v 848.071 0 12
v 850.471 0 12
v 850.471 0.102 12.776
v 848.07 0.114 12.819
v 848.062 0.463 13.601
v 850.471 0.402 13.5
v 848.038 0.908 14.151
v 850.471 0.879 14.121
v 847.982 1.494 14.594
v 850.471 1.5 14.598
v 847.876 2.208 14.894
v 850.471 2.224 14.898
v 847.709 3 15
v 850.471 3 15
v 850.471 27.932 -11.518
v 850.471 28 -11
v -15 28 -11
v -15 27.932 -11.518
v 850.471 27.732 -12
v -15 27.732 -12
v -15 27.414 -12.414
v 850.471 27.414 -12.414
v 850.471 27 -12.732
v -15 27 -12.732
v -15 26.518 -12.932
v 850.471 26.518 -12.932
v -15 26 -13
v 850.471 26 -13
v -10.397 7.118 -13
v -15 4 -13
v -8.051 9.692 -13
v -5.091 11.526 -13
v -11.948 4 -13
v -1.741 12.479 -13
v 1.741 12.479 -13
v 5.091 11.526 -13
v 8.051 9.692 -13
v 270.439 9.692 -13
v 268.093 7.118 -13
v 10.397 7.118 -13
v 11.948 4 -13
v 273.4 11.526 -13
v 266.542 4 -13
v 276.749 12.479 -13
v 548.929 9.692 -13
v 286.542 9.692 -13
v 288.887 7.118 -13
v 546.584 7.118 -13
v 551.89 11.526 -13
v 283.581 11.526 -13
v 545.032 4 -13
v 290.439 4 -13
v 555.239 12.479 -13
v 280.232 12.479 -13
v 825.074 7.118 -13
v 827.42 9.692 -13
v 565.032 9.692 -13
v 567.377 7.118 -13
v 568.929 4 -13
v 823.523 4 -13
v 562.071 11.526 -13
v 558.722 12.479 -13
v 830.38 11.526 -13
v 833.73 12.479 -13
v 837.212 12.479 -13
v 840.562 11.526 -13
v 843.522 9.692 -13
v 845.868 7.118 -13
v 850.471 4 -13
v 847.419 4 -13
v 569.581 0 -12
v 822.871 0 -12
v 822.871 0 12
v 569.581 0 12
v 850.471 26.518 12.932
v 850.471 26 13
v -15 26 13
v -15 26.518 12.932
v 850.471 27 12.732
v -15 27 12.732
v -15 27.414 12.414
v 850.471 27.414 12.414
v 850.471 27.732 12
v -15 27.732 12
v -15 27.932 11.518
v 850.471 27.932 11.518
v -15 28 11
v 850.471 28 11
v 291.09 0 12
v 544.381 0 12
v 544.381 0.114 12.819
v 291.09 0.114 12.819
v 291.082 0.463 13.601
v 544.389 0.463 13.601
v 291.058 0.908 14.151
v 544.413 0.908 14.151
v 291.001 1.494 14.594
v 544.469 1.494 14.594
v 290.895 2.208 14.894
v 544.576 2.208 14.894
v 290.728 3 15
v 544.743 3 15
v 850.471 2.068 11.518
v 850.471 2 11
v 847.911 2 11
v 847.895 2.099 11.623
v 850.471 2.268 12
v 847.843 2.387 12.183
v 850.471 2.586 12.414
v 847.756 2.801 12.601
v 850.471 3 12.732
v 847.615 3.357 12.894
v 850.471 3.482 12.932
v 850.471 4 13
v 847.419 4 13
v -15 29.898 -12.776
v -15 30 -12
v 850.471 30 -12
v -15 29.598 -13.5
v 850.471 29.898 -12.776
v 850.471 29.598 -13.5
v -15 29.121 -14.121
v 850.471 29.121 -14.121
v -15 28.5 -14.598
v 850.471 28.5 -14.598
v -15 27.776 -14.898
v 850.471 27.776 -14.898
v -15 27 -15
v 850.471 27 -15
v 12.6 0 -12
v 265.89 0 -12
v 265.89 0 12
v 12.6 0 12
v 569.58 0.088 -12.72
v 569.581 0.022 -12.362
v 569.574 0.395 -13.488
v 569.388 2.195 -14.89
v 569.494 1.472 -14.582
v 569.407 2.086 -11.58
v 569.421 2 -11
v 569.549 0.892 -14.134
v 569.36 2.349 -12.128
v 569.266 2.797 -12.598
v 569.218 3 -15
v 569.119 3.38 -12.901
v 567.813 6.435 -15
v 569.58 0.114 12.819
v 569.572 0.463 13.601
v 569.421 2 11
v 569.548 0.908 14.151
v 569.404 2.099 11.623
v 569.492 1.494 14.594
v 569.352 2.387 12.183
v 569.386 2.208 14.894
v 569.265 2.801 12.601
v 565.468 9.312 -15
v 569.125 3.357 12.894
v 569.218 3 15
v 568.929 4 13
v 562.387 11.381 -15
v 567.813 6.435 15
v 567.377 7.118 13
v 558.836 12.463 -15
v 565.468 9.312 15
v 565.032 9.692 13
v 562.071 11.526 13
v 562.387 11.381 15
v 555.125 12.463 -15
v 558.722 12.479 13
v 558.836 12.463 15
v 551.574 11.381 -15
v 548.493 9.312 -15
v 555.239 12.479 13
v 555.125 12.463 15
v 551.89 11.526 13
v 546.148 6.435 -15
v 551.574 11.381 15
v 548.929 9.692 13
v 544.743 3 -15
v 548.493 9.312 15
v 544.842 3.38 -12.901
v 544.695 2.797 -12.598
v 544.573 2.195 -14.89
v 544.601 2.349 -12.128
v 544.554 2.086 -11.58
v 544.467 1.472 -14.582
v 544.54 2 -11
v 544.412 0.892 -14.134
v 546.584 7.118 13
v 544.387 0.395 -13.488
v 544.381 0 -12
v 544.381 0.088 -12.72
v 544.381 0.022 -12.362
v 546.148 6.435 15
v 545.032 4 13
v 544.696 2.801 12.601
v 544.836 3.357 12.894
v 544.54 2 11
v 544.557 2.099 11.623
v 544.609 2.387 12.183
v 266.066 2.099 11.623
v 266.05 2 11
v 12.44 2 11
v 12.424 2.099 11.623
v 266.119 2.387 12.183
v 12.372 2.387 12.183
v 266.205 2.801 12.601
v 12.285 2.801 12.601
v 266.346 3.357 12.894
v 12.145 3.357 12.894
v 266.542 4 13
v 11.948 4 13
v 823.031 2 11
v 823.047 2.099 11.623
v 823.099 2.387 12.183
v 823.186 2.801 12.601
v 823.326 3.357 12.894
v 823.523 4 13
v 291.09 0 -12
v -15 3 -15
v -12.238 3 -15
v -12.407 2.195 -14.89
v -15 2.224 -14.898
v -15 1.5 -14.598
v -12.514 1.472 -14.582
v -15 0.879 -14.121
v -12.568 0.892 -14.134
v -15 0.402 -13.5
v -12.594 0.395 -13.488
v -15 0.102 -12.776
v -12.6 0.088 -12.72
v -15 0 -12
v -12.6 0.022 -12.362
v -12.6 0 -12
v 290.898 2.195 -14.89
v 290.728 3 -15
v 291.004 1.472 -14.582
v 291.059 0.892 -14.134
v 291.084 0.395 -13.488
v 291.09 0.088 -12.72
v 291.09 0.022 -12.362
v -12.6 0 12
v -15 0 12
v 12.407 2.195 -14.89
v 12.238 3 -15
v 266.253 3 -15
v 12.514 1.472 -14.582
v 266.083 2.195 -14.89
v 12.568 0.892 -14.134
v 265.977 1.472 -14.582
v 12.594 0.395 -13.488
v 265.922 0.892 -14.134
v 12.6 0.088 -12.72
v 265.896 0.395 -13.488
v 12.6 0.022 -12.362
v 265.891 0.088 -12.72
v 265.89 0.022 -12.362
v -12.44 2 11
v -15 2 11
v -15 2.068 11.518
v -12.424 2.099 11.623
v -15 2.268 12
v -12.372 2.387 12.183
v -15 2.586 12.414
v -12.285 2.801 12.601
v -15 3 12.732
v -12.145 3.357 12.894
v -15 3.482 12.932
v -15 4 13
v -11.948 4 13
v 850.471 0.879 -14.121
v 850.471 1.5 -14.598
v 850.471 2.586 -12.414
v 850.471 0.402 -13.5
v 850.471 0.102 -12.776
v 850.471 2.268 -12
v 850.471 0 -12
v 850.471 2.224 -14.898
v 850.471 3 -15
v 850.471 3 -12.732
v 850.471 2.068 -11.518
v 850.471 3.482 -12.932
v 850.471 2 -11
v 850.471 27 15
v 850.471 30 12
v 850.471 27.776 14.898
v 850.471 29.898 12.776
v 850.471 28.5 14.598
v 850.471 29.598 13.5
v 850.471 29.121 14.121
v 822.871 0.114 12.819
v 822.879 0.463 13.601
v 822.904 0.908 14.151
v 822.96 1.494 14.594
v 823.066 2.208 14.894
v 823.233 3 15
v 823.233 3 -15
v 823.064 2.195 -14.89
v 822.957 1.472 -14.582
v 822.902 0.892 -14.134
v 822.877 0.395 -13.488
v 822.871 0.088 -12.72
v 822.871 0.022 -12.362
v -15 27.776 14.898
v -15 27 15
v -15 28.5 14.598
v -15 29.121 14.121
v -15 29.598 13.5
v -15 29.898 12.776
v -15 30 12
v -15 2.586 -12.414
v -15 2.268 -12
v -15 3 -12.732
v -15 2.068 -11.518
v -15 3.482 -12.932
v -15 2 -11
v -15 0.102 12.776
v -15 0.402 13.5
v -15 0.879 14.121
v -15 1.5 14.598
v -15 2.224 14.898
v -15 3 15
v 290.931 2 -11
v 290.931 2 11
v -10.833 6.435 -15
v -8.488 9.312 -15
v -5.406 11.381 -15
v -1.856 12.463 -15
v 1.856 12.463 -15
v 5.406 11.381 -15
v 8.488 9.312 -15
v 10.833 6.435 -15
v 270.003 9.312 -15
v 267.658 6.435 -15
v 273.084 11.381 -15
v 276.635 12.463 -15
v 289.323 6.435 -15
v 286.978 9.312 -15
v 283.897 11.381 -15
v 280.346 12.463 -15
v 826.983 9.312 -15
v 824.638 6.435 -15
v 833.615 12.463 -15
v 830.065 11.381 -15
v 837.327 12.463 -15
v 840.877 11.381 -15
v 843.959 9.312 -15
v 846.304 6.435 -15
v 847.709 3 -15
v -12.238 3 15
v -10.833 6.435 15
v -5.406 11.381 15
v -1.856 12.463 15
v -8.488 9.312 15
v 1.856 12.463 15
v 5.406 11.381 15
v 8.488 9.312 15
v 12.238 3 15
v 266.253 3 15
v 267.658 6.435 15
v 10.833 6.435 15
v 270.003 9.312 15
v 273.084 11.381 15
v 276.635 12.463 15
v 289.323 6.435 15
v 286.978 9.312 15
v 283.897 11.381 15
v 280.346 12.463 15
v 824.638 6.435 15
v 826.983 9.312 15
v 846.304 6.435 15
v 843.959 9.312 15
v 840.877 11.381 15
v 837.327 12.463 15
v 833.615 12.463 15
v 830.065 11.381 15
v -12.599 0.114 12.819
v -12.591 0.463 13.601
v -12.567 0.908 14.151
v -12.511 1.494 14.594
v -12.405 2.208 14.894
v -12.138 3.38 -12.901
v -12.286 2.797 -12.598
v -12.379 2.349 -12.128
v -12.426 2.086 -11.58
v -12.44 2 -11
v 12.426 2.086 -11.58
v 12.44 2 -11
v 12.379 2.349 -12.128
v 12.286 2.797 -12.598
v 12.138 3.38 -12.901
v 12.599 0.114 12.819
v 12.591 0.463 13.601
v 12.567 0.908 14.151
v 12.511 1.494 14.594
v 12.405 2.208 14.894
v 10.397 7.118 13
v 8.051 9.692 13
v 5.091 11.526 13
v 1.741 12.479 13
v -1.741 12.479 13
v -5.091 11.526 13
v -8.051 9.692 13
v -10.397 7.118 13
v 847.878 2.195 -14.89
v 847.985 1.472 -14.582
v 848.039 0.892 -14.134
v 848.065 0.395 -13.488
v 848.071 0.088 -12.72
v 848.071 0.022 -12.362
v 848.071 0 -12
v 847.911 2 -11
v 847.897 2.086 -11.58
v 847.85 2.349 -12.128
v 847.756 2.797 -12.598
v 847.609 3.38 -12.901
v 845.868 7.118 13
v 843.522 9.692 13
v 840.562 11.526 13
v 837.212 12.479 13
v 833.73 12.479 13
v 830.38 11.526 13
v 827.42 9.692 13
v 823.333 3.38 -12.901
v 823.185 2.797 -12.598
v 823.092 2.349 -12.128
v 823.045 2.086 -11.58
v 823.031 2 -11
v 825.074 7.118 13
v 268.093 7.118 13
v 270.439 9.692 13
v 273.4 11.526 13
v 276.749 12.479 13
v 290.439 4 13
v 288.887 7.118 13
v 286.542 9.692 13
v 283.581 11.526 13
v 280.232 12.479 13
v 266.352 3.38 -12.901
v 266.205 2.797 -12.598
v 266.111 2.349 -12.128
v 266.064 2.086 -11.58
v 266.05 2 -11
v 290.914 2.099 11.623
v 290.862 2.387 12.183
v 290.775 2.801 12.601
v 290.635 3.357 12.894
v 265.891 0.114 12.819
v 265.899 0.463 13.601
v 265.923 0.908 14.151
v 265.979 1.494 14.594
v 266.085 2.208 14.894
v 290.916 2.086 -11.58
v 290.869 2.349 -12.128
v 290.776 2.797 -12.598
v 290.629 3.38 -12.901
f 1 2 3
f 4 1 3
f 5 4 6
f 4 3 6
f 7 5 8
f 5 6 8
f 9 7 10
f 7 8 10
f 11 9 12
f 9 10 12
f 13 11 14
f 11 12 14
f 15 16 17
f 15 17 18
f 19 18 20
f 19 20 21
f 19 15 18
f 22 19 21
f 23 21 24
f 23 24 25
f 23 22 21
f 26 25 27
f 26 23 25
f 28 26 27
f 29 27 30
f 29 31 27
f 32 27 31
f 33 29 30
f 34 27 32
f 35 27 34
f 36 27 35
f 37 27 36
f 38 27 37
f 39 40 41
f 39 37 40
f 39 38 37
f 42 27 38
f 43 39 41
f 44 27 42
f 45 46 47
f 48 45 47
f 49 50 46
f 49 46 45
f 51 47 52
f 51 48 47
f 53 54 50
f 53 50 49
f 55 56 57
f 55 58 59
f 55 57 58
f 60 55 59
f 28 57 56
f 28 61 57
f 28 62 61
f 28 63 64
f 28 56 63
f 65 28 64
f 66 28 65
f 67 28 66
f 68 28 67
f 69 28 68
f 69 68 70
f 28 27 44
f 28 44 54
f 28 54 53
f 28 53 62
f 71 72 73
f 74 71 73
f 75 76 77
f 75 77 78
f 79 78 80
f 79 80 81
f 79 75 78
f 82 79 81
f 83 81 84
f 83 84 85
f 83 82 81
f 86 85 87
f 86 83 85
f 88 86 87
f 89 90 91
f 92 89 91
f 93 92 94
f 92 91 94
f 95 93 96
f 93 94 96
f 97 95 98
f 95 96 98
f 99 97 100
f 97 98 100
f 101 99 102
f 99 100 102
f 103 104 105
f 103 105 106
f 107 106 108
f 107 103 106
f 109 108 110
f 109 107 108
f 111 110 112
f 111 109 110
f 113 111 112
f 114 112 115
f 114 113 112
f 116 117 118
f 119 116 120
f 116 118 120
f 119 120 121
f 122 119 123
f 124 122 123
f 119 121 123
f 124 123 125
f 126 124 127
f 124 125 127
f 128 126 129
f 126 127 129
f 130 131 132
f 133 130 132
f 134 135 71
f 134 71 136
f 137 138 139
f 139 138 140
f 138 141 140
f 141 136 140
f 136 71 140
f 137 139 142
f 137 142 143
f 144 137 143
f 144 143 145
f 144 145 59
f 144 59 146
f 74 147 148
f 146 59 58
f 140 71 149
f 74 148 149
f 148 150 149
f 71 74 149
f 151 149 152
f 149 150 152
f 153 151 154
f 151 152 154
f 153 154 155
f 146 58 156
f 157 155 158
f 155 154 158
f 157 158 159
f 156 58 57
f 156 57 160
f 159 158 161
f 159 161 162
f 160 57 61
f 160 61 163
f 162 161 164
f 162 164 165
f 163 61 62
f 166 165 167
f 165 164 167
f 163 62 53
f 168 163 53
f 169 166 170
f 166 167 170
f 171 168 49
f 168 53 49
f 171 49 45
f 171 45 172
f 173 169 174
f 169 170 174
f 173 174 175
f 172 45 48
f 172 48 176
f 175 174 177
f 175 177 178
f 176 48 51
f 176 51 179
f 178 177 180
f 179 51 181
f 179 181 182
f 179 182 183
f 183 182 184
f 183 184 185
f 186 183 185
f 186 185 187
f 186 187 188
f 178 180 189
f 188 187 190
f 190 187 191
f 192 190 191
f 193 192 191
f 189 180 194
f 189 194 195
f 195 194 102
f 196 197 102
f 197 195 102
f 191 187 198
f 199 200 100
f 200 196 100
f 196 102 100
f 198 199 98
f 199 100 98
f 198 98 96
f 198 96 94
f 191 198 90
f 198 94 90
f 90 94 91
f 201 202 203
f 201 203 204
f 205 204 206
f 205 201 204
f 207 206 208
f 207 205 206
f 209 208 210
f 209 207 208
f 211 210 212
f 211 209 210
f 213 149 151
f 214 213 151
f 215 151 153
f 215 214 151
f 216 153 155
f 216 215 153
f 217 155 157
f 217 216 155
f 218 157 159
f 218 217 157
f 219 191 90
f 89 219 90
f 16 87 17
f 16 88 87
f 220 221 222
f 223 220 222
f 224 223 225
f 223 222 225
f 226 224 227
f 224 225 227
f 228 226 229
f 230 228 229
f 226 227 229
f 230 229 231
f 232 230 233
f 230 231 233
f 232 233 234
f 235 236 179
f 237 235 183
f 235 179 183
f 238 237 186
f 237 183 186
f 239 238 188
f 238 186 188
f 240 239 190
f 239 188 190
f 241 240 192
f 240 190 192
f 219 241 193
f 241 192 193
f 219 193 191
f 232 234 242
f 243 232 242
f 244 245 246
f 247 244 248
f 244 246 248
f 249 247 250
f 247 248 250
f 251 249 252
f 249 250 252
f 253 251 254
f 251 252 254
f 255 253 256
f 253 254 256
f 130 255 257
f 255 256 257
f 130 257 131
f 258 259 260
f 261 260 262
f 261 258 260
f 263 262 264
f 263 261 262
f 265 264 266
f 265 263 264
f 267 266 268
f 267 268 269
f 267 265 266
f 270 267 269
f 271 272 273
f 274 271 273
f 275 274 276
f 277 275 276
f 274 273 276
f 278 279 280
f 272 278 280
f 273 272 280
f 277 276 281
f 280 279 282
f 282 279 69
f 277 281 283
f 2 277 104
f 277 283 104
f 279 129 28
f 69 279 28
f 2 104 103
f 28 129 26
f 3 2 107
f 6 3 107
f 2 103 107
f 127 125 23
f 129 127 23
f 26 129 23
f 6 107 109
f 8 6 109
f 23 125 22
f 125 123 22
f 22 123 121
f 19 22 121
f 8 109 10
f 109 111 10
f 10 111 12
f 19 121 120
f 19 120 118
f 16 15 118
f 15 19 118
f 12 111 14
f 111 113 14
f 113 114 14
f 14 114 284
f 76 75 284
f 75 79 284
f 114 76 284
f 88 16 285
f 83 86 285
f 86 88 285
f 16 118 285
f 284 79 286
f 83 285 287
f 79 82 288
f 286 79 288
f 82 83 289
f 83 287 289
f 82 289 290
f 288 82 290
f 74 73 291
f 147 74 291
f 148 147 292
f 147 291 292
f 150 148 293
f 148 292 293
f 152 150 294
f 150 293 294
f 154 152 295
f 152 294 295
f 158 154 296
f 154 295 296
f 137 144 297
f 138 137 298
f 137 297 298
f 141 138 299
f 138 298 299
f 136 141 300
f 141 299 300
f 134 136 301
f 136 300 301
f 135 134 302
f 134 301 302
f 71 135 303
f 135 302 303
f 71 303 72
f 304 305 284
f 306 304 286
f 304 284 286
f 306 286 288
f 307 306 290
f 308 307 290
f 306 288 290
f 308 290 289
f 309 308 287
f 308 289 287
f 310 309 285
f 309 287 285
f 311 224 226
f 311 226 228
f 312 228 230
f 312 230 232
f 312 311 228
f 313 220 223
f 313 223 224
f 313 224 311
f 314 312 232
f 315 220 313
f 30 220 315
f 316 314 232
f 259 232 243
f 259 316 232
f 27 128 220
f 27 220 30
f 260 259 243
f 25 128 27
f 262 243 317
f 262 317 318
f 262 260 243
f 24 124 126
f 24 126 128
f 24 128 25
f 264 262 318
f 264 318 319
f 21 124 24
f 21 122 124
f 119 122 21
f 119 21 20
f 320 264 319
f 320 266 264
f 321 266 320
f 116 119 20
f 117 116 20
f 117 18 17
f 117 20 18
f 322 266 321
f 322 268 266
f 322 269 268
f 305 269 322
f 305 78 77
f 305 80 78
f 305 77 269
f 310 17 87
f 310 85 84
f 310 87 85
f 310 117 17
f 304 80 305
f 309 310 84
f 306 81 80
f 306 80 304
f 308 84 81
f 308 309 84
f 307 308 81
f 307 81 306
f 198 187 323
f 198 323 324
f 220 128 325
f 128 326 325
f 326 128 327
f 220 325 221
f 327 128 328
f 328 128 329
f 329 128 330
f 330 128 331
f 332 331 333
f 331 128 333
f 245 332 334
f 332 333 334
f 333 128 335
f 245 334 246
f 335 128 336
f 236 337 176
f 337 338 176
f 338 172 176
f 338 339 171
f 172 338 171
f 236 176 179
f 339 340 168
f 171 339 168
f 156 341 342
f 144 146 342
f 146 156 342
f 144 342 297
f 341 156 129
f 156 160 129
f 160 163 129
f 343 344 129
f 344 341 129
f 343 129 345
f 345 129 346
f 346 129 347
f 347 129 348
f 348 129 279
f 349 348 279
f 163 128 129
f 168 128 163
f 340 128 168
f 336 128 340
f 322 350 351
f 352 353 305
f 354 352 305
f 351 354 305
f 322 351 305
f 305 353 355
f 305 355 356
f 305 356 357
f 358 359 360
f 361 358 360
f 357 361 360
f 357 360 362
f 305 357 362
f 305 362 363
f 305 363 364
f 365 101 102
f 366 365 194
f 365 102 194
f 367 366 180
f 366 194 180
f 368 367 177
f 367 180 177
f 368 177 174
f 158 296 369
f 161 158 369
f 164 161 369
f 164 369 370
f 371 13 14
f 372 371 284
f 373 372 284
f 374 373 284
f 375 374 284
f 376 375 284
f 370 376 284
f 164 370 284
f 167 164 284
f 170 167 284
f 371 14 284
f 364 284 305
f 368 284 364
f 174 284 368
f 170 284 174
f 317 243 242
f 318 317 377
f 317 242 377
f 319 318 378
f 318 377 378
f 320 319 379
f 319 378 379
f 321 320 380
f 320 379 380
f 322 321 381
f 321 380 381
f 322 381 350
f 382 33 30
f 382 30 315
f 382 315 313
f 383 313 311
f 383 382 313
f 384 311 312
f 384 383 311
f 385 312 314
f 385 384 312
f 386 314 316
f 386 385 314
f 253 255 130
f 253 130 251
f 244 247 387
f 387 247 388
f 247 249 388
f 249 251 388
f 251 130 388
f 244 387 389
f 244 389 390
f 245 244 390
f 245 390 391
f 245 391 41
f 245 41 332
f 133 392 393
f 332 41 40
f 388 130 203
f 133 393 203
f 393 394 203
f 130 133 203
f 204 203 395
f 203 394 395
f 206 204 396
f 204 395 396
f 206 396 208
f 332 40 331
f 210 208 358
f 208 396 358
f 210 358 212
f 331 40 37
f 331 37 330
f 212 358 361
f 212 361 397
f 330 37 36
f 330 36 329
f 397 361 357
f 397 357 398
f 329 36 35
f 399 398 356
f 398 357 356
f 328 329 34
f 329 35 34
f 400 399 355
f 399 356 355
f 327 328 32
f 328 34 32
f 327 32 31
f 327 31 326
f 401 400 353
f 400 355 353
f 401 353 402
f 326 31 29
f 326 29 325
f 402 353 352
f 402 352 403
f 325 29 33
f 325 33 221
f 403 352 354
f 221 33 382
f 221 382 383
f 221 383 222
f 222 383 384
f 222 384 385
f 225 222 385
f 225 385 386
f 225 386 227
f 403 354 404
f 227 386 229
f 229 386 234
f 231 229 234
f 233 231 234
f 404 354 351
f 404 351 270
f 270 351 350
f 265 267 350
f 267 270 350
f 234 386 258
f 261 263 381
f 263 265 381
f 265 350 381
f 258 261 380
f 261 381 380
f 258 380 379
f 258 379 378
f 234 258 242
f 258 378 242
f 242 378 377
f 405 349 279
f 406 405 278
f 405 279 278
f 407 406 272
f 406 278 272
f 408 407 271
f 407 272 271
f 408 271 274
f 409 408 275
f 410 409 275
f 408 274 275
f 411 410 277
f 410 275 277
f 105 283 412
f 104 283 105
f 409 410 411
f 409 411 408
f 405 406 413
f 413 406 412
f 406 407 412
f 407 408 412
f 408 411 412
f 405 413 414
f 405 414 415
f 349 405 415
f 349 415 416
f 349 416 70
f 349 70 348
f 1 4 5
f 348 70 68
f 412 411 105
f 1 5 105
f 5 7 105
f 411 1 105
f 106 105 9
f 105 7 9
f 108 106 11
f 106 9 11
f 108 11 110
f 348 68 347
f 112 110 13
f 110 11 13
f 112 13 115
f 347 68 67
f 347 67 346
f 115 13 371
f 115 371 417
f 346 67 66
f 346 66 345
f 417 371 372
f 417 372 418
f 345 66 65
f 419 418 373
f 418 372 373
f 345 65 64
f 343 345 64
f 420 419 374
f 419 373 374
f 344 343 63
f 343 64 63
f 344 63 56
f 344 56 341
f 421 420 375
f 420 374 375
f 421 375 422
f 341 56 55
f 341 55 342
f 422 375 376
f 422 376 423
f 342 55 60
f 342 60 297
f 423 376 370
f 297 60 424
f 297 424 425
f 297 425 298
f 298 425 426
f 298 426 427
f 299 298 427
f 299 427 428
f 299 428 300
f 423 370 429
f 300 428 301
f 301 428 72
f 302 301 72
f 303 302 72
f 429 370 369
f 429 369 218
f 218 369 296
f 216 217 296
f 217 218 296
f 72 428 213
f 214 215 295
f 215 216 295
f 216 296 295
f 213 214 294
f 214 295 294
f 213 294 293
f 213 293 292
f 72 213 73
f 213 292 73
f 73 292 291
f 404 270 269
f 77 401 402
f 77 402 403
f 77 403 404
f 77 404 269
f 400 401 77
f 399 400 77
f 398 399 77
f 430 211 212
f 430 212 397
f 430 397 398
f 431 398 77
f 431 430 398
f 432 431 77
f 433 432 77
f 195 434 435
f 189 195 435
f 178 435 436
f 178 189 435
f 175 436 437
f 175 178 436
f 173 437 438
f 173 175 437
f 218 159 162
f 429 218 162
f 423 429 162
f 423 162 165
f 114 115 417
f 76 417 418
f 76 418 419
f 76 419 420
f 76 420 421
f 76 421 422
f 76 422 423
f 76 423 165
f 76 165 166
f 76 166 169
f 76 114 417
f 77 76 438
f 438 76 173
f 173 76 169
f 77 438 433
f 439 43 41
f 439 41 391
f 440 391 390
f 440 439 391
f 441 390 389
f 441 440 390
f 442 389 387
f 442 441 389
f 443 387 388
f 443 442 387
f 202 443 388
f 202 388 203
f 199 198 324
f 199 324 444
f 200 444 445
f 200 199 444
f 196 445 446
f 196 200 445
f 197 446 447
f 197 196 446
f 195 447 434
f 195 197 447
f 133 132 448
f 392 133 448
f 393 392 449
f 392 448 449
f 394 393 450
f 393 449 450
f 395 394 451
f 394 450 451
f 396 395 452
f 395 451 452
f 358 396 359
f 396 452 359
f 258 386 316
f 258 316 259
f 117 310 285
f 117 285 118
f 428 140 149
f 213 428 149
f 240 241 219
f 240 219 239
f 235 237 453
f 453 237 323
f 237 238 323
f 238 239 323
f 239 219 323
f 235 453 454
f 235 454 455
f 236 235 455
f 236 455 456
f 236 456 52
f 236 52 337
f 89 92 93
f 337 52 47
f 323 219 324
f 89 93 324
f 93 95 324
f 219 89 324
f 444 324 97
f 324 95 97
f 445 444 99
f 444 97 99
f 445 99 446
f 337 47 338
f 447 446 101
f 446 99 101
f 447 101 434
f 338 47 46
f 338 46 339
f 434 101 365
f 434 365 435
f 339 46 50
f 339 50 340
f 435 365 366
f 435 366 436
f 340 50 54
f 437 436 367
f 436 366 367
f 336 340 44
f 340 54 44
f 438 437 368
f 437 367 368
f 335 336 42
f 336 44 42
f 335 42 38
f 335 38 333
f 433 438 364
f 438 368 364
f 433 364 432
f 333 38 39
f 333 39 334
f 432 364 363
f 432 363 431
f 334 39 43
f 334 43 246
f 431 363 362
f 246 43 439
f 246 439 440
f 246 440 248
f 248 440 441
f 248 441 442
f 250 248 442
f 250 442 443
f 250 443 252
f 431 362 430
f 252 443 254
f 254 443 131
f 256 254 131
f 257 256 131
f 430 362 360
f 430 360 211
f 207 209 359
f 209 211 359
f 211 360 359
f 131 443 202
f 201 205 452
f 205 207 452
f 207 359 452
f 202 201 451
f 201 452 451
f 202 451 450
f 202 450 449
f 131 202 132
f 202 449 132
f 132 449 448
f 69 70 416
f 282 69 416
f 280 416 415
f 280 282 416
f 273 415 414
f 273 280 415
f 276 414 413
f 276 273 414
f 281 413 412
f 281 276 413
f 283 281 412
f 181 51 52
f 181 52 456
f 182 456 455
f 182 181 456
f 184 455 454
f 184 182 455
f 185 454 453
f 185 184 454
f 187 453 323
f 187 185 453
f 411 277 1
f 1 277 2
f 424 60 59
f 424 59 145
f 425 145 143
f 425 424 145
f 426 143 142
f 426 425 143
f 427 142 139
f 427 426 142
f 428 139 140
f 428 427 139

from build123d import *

# Parameters (mm, degrees)
EXTRUDE_1_DEPTH      = 850.470859
EXTRUDE_1_DEPTH_BACK = 15
SKETCH_3_R           = 12.6
CUT_EXTRUDE_1_DEPTH  = 31


with BuildPart() as part:
    # Эскиз2 → Бобышка-Вытянуть1 (new body, two sides)
    with BuildSketch(Plane(origin=(0, 0, 0), x_dir=(0, 0, -1), z_dir=(1, 0, 0))) as extrude_1_sk:
        with BuildLine():
            Line((-12, 30), (12, 30))
            ThreePointArc((12, 30), (14.121320344, 29.121320344), (15, 27))
            Line((15, 27), (15, 3))
            ThreePointArc((15, 3), (14.121320344, 0.878679656), (12, 0))
            Line((12, 0), (-12, 0))
            ThreePointArc((-12, 0), (-14.121320344, 0.878679656), (-15, 3))
            Line((-15, 3), (-15, 27))
            ThreePointArc((-15, 27), (-14.121320344, 29.121320344), (-12, 30))
        make_face()
        with BuildLine():
            Line((-11, 28), (11, 28))
            ThreePointArc((11, 28), (12.414213562, 27.414213562), (13, 26))
            Line((13, 26), (13, 4))
            ThreePointArc((13, 4), (12.414213562, 2.585786438), (11, 2))
            Line((11, 2), (-11, 2))
            ThreePointArc((-11, 2), (-12.414213562, 2.585786438), (-13, 4))
            Line((-13, 4), (-13, 26))
            ThreePointArc((-13, 26), (-12.414213562, 27.414213562), (-11, 28))
        make_face(mode=Mode.SUBTRACT)
    extrude(amount=EXTRUDE_1_DEPTH)
    extrude(extrude_1_sk.sketch, amount=-EXTRUDE_1_DEPTH_BACK)

    # Эскиз3 → Вырез-Вытянуть1 (cut, through all)
    with BuildSketch(Plane.XY.offset(15)):
        Circle(SKETCH_3_R)
        with Locations((278.490286217, 0)):
            Circle(SKETCH_3_R)
        with Locations((556.980572433, 0)):
            Circle(SKETCH_3_R)
        with Locations((835.47085865, 0)):
            Circle(SKETCH_3_R)
    extrude(amount=-CUT_EXTRUDE_1_DEPTH, mode=Mode.SUBTRACT)


solid = part.part
